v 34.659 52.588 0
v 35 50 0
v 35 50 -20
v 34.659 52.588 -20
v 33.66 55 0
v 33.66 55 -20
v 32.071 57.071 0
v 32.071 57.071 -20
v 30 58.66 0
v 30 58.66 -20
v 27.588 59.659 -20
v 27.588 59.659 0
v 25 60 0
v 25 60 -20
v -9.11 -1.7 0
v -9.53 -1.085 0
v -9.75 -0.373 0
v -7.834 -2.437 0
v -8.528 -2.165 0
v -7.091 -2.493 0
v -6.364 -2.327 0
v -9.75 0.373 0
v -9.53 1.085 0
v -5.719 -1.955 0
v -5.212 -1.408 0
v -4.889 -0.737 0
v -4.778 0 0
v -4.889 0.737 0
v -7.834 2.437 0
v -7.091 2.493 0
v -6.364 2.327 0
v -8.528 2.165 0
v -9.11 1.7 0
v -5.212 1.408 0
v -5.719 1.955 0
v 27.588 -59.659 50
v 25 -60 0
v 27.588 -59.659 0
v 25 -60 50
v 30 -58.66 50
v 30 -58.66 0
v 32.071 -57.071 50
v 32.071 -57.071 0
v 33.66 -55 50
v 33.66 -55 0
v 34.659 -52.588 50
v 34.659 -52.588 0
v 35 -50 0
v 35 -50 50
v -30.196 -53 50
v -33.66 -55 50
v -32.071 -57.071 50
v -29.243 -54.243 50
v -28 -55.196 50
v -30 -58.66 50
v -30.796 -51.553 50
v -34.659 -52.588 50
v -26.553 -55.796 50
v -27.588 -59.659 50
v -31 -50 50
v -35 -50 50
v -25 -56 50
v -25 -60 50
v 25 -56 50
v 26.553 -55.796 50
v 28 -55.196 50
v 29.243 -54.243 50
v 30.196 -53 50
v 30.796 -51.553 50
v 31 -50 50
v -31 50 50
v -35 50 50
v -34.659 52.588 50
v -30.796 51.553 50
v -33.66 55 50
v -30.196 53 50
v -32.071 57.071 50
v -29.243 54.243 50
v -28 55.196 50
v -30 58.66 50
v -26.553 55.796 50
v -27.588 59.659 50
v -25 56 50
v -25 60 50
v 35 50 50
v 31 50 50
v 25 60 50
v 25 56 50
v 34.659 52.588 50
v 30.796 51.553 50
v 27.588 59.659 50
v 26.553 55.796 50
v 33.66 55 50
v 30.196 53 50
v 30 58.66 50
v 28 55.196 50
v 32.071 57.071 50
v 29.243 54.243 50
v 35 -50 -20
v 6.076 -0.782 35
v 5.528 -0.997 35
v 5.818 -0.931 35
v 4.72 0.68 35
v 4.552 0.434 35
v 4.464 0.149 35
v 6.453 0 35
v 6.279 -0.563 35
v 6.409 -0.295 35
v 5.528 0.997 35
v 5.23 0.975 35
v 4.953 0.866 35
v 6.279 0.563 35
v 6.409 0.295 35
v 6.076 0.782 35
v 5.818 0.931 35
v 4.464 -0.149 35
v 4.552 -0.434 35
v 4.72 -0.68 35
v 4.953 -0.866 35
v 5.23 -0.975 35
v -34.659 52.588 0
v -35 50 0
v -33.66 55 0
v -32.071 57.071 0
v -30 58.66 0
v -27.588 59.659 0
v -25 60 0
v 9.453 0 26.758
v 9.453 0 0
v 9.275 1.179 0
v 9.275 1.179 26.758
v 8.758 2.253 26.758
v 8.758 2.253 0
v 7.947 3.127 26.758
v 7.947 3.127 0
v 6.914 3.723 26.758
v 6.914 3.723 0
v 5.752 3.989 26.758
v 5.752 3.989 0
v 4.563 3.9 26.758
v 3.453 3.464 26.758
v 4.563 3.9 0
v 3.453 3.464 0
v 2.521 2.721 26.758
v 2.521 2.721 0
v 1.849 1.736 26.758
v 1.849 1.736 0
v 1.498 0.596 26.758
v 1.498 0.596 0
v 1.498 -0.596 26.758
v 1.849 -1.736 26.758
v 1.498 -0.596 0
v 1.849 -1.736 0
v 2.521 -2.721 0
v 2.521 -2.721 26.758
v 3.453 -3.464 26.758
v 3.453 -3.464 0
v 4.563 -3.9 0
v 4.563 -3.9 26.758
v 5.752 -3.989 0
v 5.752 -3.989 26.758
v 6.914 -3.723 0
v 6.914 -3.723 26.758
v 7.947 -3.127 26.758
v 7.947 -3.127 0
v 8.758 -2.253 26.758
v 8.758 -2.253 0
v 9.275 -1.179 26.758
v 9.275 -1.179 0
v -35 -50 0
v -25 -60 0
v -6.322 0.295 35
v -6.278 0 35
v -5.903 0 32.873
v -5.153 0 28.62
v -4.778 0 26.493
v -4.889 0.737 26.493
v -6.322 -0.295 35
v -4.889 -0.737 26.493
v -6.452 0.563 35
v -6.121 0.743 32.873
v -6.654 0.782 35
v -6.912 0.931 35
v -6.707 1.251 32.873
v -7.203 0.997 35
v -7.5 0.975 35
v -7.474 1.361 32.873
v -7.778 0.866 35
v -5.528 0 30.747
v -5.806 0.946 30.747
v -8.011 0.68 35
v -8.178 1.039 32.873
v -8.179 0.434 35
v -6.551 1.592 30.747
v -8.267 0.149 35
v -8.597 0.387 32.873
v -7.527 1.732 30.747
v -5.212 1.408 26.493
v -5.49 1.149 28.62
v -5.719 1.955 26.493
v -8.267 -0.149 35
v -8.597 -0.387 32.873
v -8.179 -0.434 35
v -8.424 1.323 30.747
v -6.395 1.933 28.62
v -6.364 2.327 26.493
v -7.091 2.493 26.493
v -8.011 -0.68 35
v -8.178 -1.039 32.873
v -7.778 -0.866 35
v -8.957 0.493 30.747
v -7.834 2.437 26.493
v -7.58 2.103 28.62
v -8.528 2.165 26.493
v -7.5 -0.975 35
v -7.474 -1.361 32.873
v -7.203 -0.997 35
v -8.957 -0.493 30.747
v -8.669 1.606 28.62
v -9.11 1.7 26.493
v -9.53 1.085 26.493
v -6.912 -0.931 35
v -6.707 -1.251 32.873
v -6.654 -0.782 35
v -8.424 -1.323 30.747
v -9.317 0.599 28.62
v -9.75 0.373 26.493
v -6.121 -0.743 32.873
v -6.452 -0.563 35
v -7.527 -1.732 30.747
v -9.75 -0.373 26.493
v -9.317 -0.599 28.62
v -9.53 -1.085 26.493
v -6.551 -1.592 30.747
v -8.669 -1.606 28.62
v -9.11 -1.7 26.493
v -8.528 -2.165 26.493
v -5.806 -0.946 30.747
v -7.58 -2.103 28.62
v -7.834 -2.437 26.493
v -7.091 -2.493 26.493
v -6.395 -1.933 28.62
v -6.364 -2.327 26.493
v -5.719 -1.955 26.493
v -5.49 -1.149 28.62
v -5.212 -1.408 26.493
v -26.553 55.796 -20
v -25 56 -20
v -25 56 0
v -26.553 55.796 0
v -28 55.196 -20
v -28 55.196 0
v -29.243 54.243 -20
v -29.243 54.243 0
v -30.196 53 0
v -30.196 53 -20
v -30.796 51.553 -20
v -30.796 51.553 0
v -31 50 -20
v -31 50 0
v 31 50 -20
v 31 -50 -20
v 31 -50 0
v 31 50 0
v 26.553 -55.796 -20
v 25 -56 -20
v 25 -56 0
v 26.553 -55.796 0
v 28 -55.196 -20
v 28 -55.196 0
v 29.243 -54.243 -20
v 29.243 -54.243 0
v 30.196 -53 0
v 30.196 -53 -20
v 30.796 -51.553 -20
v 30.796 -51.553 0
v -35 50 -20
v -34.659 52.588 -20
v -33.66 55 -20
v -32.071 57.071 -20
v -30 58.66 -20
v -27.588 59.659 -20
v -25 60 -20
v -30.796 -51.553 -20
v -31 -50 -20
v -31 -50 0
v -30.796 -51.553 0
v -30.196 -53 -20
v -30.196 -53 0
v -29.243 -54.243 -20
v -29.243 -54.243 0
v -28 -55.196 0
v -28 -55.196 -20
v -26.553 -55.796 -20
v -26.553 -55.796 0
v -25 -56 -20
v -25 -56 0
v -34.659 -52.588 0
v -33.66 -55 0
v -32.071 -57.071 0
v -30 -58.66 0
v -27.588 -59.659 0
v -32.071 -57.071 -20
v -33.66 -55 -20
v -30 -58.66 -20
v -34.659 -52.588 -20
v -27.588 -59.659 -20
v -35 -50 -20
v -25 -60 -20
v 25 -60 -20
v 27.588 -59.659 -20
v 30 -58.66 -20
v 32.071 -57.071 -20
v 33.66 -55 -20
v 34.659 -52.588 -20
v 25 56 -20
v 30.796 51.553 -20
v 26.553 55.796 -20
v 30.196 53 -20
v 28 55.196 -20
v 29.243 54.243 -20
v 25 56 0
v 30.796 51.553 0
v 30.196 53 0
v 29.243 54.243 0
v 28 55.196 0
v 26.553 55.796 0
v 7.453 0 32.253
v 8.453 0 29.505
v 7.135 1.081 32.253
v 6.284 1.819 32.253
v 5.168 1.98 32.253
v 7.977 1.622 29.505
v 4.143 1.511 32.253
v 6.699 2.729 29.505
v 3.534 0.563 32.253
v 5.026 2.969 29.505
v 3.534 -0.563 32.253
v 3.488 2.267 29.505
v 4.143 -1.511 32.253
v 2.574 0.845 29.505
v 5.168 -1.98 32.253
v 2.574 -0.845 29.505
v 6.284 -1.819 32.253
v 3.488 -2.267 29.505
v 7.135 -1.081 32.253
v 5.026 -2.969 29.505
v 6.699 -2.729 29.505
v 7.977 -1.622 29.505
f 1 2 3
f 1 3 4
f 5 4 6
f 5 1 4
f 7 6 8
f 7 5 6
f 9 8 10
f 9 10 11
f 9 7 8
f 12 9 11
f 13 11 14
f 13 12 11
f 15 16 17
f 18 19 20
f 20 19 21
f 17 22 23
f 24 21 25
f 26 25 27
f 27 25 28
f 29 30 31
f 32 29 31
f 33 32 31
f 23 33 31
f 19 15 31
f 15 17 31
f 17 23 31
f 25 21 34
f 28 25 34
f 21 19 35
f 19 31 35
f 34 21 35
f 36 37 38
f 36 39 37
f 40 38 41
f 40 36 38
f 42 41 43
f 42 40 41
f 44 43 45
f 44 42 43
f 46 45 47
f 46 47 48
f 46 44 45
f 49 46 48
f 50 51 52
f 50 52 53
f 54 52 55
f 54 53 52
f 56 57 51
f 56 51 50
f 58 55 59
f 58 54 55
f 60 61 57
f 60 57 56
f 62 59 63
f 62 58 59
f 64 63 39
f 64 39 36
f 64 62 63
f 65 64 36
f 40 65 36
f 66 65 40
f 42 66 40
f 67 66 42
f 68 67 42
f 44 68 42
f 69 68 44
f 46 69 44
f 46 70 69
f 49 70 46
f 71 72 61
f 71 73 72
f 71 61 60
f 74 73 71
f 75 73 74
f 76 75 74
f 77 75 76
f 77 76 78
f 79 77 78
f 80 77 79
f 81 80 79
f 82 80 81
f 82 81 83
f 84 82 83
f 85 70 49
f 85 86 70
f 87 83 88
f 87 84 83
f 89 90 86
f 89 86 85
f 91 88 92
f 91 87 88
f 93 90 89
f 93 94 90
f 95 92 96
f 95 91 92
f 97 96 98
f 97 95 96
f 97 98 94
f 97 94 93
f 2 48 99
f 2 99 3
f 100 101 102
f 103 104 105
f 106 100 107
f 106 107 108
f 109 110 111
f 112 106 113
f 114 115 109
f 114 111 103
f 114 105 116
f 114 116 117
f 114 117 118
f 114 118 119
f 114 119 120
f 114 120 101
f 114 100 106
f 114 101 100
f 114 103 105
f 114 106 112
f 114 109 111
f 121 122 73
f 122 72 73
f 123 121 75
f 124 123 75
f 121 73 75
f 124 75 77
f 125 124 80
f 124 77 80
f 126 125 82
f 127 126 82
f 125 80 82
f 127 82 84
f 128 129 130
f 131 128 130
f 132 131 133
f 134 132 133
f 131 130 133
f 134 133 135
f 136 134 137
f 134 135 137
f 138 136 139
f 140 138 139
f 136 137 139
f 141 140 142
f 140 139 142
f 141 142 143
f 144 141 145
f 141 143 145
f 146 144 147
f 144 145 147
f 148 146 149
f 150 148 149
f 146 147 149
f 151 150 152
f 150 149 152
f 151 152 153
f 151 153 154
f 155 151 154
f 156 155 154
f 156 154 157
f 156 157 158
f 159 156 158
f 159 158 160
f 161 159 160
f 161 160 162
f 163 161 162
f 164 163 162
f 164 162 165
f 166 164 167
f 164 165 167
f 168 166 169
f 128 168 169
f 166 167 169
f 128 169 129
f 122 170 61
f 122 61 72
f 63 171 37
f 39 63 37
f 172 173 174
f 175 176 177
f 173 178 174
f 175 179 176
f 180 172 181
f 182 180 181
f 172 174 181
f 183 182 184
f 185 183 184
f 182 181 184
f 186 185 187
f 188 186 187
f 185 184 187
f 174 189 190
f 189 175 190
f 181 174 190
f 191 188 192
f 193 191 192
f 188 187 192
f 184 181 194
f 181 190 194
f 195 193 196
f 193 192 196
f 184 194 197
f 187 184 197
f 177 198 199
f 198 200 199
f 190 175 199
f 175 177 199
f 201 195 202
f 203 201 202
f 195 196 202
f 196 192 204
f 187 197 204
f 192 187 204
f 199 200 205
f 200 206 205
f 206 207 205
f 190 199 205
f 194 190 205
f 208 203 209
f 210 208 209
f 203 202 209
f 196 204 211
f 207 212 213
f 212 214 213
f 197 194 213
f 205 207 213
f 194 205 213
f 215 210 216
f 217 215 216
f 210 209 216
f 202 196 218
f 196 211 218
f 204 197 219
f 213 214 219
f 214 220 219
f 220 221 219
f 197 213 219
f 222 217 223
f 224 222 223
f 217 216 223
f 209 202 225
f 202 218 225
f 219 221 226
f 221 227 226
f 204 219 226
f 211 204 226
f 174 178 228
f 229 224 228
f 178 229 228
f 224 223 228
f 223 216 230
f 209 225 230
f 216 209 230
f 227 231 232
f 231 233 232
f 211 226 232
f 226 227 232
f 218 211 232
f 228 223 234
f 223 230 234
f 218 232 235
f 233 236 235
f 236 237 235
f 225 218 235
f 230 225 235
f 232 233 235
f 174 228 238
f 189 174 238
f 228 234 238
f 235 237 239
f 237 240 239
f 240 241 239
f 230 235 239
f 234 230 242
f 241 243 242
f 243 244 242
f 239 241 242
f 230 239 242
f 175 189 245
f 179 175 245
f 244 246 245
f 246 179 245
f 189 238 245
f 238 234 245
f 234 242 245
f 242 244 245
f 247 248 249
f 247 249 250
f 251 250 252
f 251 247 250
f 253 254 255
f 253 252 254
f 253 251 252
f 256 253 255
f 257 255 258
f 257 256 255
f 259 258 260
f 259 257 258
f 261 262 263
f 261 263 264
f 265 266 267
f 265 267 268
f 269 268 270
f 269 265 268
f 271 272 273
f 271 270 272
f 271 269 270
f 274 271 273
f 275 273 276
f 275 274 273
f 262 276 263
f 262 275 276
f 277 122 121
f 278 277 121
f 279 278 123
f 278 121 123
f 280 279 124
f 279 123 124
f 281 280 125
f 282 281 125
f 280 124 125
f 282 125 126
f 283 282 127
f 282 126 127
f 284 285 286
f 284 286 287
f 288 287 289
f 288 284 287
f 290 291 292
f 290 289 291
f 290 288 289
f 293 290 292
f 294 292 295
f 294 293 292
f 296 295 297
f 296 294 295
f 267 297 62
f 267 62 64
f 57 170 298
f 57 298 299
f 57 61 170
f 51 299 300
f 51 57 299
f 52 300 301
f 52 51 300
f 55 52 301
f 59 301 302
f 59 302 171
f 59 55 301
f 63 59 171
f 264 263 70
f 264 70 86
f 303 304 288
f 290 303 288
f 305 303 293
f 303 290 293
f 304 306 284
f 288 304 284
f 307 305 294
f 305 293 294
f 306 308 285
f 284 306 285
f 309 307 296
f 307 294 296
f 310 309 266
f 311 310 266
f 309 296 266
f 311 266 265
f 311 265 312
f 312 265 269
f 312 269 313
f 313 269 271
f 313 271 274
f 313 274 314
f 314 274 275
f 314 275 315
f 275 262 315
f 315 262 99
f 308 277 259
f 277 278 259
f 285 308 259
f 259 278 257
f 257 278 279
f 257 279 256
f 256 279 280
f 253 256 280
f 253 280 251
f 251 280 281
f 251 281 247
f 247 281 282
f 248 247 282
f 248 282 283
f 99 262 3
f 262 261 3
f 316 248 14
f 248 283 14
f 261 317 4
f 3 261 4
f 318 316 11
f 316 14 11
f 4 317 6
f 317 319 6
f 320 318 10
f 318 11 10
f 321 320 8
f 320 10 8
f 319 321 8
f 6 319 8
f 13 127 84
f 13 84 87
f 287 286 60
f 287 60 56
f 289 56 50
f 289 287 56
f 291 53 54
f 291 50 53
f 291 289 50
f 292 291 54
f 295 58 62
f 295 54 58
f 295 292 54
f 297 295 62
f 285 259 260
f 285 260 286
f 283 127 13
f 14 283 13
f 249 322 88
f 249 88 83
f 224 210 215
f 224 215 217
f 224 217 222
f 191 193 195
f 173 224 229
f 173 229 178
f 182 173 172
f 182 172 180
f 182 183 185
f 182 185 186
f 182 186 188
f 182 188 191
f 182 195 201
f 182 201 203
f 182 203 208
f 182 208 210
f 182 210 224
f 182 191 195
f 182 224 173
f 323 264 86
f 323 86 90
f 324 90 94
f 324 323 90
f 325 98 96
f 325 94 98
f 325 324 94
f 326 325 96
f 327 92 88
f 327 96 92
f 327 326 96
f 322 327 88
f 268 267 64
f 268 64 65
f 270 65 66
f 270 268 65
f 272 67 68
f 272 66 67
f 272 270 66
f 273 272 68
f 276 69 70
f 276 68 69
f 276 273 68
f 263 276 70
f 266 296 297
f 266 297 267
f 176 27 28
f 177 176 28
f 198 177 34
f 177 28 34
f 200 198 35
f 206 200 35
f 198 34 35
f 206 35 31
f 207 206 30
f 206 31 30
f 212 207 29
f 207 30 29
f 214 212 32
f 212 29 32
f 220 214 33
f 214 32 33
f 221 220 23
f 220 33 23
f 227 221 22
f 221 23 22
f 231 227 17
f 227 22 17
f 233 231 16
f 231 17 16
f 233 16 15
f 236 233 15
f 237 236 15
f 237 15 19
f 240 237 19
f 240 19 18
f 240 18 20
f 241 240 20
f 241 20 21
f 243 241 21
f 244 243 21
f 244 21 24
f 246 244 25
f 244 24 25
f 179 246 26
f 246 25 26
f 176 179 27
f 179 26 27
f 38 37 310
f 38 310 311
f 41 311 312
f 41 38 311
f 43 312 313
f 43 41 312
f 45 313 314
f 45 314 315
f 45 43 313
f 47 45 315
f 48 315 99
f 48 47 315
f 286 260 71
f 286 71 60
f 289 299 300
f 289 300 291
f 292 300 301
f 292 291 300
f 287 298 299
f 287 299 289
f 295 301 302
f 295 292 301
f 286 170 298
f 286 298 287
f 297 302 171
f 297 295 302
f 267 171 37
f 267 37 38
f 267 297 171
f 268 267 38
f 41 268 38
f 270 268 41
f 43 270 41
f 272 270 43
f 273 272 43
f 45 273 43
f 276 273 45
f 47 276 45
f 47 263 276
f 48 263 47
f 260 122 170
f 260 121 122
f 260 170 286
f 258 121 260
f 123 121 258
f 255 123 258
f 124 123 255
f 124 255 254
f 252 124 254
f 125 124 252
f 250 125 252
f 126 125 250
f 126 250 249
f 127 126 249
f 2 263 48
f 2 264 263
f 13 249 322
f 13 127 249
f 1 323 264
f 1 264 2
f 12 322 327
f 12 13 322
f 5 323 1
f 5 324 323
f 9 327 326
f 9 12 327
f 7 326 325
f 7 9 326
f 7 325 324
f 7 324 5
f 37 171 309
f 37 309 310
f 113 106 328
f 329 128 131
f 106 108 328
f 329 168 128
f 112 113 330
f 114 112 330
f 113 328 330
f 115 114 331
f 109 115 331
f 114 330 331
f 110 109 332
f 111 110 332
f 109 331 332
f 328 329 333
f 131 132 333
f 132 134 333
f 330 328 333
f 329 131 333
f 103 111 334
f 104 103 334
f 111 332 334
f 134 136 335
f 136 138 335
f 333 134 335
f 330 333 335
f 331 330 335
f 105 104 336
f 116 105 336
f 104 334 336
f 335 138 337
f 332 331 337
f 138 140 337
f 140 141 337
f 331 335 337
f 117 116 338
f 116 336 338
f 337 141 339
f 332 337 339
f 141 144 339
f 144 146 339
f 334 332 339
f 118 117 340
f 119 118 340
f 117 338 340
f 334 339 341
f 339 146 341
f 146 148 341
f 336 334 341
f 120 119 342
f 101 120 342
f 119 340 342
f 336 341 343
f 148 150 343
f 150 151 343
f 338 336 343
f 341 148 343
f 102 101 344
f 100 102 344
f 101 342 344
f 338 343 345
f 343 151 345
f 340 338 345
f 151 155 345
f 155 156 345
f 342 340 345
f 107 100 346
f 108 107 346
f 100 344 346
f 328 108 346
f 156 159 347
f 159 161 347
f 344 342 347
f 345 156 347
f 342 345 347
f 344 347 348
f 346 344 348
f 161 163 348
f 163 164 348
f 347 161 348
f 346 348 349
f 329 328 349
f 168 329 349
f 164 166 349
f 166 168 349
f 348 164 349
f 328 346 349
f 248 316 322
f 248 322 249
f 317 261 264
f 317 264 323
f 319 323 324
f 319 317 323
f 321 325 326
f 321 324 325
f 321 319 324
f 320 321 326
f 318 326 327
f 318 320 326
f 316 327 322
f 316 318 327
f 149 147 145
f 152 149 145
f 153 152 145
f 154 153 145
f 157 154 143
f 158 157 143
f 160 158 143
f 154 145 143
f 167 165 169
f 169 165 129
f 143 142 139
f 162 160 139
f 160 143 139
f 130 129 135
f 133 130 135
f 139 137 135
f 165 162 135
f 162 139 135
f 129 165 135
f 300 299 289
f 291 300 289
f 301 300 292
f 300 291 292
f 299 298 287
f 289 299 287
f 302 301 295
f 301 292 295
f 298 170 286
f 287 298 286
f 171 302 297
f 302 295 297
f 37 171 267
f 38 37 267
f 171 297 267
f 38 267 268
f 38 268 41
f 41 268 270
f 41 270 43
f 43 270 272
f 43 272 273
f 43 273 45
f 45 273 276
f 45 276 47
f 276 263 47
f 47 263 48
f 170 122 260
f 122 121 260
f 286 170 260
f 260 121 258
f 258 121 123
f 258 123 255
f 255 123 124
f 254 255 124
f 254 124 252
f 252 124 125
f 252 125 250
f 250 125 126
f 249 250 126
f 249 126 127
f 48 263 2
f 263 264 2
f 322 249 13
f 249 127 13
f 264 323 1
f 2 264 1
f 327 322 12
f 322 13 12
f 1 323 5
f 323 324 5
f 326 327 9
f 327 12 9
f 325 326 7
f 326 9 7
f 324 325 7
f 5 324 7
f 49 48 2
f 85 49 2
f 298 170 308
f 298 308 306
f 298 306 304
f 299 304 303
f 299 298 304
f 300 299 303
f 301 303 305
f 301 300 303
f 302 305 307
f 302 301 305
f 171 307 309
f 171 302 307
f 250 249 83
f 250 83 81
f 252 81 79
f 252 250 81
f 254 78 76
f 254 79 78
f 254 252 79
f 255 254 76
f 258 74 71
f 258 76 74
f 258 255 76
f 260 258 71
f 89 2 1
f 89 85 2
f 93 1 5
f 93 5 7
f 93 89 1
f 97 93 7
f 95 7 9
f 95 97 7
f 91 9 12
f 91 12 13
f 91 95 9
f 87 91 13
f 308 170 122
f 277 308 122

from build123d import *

# Parameters (mm, degrees)
F0_R          = 2.5
F0_R_2        = 4
F1_DEPTH      = 35
F2_SIZE2      = 8.2424322584
F2_SIZE       = 3
F3_SIZE2      = 8.5069227294
F3_SIZE       = 1.5
F4_W          = 70
F4_H          = 120
F5_DEPTH      = 50
F6_R          = 10
F7_DEPTH      = 20
F9_DEPTH      = 20.001
F9_DEPTH_BACK = 50.001


with BuildPart() as f1:
    # F0 (on Top) → F1 (new body)
    with BuildSketch(Plane.XY):
        with Locations((-7.2778258292, 0)):
            Circle(F0_R)
        with Locations((5.452941441, 0)):
            Circle(F0_R_2)
    extrude(amount=F1_DEPTH)

    # F2
    f2_edges = [f1.edges().sort_by_distance(p)[0] for p in [
        (1.452941, 0, 35),
    ]]
    f2_side = f1.faces().sort_by_distance((5.452941, 0, 35))[0]
    chamfer(f2_edges, length=F2_SIZE, length2=F2_SIZE2, reference=f2_side)

    # F3
    f3_edges = [f1.edges().sort_by_distance(p)[0] for p in [
        (-9.777826, 0, 35),
    ]]
    f3_side = f1.faces().sort_by_distance((-7.277826, 0, 35))[0]
    chamfer(f3_edges, length=F3_SIZE, length2=F3_SIZE2, reference=f3_side)


with BuildPart() as f5:
    # F4 (on Top) → F5 (new body)
    with BuildSketch(Plane.XY):
        Rectangle(F4_W, F4_H)
    extrude(amount=F5_DEPTH)

    # F6
    f6_edges = [f5.edges().sort_by_distance(p)[0] for p in [
        (-35, 60, 25),
        (35, 60, 25),
        (35, -60, 25),
        (-35, -60, 25),
    ]]
    fillet(f6_edges, radius=F6_R)


with BuildPart() as f7:
    # F7 (new): a face of the model
    f7_faces = [f5.part.faces().sort_by_distance(p)[0] for p in [
        (0, 0, 0),
    ]]
    extrude(f7_faces, amount=F7_DEPTH)


with BuildPart() as f9_tool:
    # F8 (on Top) → F9 (new body, two sides)
    with BuildSketch(Plane.XY) as f9_sk:
        with BuildLine():
            Line((-31, 50), (-31, -50))
            ThreePointArc((-31, -50), (-29.2426406871, -54.2426406871), (-25, -56))
            Line((-25, -56), (25, -56))
            ThreePointArc((25, -56), (29.2426406871, -54.2426406871), (31, -50))
            Line((31, -50), (31, 50))
            ThreePointArc((31, 50), (29.2426406871, 54.2426406871), (25, 56))
            Line((25, 56), (-25, 56))
            ThreePointArc((-25, 56), (-29.2426406871, 54.2426406871), (-31, 50))
        make_face()
    extrude(amount=-F9_DEPTH)
    extrude(f9_sk.sketch, amount=F9_DEPTH_BACK)


with BuildPart() as f5_1:
    add(f5.part)

    # F9: cut by f9_tool
    add(f9_tool.part, mode=Mode.SUBTRACT)


with BuildPart() as f7_1:
    add(f7.part)

    # F9: cut by f9_tool
    add(f9_tool.part, mode=Mode.SUBTRACT)


solid = Compound([f1.part, f5_1.part, f7_1.part])
